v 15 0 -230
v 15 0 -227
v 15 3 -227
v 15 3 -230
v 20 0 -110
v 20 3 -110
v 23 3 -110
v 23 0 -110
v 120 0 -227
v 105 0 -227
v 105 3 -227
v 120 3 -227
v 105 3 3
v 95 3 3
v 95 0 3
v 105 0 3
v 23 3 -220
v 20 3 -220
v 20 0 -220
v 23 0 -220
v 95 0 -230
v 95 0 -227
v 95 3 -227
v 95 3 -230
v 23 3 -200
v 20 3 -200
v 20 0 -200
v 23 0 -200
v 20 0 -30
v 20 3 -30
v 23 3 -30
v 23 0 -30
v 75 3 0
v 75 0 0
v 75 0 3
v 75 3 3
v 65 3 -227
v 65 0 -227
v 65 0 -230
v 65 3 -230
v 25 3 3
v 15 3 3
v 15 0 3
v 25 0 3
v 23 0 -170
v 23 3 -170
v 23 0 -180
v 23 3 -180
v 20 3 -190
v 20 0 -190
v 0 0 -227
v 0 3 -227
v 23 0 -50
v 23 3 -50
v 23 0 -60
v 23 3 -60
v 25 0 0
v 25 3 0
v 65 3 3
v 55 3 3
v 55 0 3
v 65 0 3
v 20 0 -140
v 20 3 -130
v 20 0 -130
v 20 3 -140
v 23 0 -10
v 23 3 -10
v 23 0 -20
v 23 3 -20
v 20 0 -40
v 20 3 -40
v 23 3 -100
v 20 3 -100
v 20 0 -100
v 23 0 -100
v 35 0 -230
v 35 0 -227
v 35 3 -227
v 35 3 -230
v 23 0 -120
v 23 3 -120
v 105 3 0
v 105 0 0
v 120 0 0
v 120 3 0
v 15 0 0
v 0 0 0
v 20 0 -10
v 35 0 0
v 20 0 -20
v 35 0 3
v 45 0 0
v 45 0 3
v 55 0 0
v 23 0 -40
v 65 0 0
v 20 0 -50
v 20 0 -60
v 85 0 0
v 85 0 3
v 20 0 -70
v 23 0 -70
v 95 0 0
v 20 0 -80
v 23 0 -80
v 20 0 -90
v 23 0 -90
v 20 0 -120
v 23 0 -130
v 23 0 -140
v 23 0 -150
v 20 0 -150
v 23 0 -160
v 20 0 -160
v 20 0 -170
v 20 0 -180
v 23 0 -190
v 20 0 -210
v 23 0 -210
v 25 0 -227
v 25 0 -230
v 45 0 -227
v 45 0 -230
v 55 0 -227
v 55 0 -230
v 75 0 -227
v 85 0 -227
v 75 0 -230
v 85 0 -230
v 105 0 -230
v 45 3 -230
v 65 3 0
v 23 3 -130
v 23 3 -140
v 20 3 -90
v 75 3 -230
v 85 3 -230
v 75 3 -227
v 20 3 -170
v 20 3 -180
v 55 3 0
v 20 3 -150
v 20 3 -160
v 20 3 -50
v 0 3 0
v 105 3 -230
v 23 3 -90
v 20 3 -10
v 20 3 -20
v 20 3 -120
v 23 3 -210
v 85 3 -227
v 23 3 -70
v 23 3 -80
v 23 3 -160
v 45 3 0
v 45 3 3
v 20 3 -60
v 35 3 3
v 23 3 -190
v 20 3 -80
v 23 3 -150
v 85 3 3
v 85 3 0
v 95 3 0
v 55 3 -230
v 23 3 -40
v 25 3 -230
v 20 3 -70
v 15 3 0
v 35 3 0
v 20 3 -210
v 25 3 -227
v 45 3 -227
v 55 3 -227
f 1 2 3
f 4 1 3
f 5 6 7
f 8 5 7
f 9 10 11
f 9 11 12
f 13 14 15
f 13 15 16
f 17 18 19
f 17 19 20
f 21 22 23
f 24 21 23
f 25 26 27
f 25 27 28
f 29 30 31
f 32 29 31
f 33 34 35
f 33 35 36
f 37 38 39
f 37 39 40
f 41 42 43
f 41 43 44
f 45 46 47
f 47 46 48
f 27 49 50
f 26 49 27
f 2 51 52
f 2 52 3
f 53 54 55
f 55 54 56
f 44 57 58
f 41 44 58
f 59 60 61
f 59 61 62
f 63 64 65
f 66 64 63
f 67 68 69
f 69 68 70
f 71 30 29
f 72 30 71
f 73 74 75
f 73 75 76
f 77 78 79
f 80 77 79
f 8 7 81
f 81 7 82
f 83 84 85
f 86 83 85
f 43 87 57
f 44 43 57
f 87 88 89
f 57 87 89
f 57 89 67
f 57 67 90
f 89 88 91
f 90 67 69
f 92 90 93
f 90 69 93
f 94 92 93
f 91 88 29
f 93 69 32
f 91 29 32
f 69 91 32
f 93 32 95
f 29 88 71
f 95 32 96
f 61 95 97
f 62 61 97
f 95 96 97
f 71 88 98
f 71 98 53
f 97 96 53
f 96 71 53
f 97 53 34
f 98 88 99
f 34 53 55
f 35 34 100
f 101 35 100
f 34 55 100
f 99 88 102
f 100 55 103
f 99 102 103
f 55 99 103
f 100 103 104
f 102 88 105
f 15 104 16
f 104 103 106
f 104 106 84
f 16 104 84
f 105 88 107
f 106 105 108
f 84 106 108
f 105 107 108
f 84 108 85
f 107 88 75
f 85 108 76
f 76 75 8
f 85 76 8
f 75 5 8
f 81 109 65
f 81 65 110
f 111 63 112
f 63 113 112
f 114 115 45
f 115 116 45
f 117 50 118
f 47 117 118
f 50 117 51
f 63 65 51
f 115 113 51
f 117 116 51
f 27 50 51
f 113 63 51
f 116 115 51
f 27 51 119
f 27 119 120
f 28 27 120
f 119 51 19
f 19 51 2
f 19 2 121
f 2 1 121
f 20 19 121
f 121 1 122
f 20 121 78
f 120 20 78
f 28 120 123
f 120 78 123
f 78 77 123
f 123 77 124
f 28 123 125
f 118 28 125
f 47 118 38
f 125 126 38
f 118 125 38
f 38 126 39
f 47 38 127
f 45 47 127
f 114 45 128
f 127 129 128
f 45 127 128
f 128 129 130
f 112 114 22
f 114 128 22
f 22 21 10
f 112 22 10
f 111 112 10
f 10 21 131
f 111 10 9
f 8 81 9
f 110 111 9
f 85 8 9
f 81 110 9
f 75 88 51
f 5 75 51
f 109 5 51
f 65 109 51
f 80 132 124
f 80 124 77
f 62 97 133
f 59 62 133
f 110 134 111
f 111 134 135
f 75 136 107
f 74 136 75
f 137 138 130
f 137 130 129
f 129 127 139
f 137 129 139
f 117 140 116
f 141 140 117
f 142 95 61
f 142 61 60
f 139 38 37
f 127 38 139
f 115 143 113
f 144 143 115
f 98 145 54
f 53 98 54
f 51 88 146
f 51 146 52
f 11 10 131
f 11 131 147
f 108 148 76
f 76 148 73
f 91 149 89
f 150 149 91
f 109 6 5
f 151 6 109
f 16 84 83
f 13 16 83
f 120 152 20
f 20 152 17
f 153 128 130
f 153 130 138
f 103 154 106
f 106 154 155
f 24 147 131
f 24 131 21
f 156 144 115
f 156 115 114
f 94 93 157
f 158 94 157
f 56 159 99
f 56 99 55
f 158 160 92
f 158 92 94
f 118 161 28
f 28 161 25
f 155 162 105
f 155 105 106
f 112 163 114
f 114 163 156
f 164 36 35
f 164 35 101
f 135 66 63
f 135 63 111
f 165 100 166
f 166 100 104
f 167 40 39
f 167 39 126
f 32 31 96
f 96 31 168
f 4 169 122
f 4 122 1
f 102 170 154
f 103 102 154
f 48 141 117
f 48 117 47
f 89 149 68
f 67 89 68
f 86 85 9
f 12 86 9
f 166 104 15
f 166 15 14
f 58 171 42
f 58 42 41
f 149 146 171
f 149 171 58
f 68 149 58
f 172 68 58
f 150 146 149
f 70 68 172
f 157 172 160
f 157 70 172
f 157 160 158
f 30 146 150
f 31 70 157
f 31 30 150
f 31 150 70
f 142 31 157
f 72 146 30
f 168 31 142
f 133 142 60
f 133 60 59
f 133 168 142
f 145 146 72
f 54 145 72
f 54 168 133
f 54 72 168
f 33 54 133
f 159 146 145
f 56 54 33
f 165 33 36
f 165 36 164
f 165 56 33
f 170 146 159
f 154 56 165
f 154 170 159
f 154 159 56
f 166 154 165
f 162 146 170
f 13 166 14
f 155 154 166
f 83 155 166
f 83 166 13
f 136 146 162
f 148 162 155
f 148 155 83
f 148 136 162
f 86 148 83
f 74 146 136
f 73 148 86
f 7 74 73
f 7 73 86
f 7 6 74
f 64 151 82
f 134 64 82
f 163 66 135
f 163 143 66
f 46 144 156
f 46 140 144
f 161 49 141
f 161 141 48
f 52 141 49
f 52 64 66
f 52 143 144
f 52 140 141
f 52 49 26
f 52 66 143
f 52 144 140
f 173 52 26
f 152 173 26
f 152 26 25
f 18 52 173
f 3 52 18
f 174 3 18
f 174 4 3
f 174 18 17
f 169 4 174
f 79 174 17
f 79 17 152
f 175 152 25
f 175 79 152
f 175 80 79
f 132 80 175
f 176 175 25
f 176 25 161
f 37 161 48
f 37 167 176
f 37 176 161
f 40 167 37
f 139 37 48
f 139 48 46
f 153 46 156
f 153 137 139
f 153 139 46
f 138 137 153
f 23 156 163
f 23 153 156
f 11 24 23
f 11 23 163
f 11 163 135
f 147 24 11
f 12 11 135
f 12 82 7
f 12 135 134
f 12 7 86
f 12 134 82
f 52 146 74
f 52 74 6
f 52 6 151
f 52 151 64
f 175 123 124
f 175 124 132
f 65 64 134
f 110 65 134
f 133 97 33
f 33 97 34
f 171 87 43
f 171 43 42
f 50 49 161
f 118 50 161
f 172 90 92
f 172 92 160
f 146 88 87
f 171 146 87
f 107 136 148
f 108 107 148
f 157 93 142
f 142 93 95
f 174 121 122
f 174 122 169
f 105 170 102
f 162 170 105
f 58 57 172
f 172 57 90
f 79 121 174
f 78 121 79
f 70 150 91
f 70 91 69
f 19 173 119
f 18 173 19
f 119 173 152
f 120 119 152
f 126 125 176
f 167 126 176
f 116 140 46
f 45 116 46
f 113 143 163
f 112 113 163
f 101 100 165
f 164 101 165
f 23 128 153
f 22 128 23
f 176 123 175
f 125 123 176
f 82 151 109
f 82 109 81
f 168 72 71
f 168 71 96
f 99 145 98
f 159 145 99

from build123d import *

# Parameters (mm, degrees)
SKETCH1_W           = 120
SKETCH1_H           = 227
BOSS_EXTRUDE1_DEPTH = 3
SKETCH2_W           = 10
SKETCH2_H           = 3
BOSS_EXTRUDE2_DEPTH = 3
LPATTERN1_COUNT     = 5
LPATTERN1_PITCH     = 20
SKETCH3_W           = 10
SKETCH3_H           = 3
BOSS_EXTRUDE3_DEPTH = 3
LPATTERN2_COUNT     = 5
LPATTERN2_PITCH     = 20
SKETCH4_W           = 3
SKETCH4_H           = 10
CUT_EXTRUDE1_DEPTH  = 4
LPATTERN3_COUNT     = 11
LPATTERN3_PITCH     = 20


with BuildPart() as part:
    # Sketch1 → Boss-Extrude1 (new body)
    with BuildSketch(Plane(origin=(0, 0, 0), x_dir=(1, 0, 0), z_dir=(0, 1, 0))):
        with Locations((60, 113.5)):
            Rectangle(SKETCH1_W, SKETCH1_H)
    extrude(amount=BOSS_EXTRUDE1_DEPTH)

    # Sketch2 → Boss-Extrude2 (add)
    with BuildSketch(Plane.XY):
        with Locations((20, 1.5)):
            Rectangle(SKETCH2_W, SKETCH2_H)
    boss_extrude2 = extrude(amount=BOSS_EXTRUDE2_DEPTH)

    # LPattern1: Boss-Extrude2 ×5
    with Locations(*[(i * LPATTERN1_PITCH, 0, 0) for i in range(1, LPATTERN1_COUNT)]):
        add(boss_extrude2)

    # Sketch3 → Boss-Extrude3 (add)
    with BuildSketch(Plane(origin=(0, 0, -227), x_dir=(-1, 0, 0), z_dir=(0, 0, -1))):
        with Locations((-100, 1.5)):
            Rectangle(SKETCH3_W, SKETCH3_H)
    boss_extrude3 = extrude(amount=BOSS_EXTRUDE3_DEPTH)

    # LPattern2: Boss-Extrude3 ×5
    with Locations(*[(-i * LPATTERN2_PITCH, 0, 0) for i in range(1, LPATTERN2_COUNT)]):
        add(boss_extrude3)

    # Sketch4 → Cut-Extrude1 (cut, through all)
    with BuildSketch(Plane(origin=(0, 3, 0), x_dir=(1, 0, 0), z_dir=(0, 1, 0))):
        with Locations((21.5, 15)):
            Rectangle(SKETCH4_W, SKETCH4_H)
    cut_extrude1 = extrude(amount=-CUT_EXTRUDE1_DEPTH, mode=Mode.SUBTRACT)

    # LPattern3: Cut-Extrude1 ×11
    with Locations(*[(0, 0, -i * LPATTERN3_PITCH) for i in range(1, LPATTERN3_COUNT)]):
        add(cut_extrude1, mode=Mode.SUBTRACT)


solid = part.part
